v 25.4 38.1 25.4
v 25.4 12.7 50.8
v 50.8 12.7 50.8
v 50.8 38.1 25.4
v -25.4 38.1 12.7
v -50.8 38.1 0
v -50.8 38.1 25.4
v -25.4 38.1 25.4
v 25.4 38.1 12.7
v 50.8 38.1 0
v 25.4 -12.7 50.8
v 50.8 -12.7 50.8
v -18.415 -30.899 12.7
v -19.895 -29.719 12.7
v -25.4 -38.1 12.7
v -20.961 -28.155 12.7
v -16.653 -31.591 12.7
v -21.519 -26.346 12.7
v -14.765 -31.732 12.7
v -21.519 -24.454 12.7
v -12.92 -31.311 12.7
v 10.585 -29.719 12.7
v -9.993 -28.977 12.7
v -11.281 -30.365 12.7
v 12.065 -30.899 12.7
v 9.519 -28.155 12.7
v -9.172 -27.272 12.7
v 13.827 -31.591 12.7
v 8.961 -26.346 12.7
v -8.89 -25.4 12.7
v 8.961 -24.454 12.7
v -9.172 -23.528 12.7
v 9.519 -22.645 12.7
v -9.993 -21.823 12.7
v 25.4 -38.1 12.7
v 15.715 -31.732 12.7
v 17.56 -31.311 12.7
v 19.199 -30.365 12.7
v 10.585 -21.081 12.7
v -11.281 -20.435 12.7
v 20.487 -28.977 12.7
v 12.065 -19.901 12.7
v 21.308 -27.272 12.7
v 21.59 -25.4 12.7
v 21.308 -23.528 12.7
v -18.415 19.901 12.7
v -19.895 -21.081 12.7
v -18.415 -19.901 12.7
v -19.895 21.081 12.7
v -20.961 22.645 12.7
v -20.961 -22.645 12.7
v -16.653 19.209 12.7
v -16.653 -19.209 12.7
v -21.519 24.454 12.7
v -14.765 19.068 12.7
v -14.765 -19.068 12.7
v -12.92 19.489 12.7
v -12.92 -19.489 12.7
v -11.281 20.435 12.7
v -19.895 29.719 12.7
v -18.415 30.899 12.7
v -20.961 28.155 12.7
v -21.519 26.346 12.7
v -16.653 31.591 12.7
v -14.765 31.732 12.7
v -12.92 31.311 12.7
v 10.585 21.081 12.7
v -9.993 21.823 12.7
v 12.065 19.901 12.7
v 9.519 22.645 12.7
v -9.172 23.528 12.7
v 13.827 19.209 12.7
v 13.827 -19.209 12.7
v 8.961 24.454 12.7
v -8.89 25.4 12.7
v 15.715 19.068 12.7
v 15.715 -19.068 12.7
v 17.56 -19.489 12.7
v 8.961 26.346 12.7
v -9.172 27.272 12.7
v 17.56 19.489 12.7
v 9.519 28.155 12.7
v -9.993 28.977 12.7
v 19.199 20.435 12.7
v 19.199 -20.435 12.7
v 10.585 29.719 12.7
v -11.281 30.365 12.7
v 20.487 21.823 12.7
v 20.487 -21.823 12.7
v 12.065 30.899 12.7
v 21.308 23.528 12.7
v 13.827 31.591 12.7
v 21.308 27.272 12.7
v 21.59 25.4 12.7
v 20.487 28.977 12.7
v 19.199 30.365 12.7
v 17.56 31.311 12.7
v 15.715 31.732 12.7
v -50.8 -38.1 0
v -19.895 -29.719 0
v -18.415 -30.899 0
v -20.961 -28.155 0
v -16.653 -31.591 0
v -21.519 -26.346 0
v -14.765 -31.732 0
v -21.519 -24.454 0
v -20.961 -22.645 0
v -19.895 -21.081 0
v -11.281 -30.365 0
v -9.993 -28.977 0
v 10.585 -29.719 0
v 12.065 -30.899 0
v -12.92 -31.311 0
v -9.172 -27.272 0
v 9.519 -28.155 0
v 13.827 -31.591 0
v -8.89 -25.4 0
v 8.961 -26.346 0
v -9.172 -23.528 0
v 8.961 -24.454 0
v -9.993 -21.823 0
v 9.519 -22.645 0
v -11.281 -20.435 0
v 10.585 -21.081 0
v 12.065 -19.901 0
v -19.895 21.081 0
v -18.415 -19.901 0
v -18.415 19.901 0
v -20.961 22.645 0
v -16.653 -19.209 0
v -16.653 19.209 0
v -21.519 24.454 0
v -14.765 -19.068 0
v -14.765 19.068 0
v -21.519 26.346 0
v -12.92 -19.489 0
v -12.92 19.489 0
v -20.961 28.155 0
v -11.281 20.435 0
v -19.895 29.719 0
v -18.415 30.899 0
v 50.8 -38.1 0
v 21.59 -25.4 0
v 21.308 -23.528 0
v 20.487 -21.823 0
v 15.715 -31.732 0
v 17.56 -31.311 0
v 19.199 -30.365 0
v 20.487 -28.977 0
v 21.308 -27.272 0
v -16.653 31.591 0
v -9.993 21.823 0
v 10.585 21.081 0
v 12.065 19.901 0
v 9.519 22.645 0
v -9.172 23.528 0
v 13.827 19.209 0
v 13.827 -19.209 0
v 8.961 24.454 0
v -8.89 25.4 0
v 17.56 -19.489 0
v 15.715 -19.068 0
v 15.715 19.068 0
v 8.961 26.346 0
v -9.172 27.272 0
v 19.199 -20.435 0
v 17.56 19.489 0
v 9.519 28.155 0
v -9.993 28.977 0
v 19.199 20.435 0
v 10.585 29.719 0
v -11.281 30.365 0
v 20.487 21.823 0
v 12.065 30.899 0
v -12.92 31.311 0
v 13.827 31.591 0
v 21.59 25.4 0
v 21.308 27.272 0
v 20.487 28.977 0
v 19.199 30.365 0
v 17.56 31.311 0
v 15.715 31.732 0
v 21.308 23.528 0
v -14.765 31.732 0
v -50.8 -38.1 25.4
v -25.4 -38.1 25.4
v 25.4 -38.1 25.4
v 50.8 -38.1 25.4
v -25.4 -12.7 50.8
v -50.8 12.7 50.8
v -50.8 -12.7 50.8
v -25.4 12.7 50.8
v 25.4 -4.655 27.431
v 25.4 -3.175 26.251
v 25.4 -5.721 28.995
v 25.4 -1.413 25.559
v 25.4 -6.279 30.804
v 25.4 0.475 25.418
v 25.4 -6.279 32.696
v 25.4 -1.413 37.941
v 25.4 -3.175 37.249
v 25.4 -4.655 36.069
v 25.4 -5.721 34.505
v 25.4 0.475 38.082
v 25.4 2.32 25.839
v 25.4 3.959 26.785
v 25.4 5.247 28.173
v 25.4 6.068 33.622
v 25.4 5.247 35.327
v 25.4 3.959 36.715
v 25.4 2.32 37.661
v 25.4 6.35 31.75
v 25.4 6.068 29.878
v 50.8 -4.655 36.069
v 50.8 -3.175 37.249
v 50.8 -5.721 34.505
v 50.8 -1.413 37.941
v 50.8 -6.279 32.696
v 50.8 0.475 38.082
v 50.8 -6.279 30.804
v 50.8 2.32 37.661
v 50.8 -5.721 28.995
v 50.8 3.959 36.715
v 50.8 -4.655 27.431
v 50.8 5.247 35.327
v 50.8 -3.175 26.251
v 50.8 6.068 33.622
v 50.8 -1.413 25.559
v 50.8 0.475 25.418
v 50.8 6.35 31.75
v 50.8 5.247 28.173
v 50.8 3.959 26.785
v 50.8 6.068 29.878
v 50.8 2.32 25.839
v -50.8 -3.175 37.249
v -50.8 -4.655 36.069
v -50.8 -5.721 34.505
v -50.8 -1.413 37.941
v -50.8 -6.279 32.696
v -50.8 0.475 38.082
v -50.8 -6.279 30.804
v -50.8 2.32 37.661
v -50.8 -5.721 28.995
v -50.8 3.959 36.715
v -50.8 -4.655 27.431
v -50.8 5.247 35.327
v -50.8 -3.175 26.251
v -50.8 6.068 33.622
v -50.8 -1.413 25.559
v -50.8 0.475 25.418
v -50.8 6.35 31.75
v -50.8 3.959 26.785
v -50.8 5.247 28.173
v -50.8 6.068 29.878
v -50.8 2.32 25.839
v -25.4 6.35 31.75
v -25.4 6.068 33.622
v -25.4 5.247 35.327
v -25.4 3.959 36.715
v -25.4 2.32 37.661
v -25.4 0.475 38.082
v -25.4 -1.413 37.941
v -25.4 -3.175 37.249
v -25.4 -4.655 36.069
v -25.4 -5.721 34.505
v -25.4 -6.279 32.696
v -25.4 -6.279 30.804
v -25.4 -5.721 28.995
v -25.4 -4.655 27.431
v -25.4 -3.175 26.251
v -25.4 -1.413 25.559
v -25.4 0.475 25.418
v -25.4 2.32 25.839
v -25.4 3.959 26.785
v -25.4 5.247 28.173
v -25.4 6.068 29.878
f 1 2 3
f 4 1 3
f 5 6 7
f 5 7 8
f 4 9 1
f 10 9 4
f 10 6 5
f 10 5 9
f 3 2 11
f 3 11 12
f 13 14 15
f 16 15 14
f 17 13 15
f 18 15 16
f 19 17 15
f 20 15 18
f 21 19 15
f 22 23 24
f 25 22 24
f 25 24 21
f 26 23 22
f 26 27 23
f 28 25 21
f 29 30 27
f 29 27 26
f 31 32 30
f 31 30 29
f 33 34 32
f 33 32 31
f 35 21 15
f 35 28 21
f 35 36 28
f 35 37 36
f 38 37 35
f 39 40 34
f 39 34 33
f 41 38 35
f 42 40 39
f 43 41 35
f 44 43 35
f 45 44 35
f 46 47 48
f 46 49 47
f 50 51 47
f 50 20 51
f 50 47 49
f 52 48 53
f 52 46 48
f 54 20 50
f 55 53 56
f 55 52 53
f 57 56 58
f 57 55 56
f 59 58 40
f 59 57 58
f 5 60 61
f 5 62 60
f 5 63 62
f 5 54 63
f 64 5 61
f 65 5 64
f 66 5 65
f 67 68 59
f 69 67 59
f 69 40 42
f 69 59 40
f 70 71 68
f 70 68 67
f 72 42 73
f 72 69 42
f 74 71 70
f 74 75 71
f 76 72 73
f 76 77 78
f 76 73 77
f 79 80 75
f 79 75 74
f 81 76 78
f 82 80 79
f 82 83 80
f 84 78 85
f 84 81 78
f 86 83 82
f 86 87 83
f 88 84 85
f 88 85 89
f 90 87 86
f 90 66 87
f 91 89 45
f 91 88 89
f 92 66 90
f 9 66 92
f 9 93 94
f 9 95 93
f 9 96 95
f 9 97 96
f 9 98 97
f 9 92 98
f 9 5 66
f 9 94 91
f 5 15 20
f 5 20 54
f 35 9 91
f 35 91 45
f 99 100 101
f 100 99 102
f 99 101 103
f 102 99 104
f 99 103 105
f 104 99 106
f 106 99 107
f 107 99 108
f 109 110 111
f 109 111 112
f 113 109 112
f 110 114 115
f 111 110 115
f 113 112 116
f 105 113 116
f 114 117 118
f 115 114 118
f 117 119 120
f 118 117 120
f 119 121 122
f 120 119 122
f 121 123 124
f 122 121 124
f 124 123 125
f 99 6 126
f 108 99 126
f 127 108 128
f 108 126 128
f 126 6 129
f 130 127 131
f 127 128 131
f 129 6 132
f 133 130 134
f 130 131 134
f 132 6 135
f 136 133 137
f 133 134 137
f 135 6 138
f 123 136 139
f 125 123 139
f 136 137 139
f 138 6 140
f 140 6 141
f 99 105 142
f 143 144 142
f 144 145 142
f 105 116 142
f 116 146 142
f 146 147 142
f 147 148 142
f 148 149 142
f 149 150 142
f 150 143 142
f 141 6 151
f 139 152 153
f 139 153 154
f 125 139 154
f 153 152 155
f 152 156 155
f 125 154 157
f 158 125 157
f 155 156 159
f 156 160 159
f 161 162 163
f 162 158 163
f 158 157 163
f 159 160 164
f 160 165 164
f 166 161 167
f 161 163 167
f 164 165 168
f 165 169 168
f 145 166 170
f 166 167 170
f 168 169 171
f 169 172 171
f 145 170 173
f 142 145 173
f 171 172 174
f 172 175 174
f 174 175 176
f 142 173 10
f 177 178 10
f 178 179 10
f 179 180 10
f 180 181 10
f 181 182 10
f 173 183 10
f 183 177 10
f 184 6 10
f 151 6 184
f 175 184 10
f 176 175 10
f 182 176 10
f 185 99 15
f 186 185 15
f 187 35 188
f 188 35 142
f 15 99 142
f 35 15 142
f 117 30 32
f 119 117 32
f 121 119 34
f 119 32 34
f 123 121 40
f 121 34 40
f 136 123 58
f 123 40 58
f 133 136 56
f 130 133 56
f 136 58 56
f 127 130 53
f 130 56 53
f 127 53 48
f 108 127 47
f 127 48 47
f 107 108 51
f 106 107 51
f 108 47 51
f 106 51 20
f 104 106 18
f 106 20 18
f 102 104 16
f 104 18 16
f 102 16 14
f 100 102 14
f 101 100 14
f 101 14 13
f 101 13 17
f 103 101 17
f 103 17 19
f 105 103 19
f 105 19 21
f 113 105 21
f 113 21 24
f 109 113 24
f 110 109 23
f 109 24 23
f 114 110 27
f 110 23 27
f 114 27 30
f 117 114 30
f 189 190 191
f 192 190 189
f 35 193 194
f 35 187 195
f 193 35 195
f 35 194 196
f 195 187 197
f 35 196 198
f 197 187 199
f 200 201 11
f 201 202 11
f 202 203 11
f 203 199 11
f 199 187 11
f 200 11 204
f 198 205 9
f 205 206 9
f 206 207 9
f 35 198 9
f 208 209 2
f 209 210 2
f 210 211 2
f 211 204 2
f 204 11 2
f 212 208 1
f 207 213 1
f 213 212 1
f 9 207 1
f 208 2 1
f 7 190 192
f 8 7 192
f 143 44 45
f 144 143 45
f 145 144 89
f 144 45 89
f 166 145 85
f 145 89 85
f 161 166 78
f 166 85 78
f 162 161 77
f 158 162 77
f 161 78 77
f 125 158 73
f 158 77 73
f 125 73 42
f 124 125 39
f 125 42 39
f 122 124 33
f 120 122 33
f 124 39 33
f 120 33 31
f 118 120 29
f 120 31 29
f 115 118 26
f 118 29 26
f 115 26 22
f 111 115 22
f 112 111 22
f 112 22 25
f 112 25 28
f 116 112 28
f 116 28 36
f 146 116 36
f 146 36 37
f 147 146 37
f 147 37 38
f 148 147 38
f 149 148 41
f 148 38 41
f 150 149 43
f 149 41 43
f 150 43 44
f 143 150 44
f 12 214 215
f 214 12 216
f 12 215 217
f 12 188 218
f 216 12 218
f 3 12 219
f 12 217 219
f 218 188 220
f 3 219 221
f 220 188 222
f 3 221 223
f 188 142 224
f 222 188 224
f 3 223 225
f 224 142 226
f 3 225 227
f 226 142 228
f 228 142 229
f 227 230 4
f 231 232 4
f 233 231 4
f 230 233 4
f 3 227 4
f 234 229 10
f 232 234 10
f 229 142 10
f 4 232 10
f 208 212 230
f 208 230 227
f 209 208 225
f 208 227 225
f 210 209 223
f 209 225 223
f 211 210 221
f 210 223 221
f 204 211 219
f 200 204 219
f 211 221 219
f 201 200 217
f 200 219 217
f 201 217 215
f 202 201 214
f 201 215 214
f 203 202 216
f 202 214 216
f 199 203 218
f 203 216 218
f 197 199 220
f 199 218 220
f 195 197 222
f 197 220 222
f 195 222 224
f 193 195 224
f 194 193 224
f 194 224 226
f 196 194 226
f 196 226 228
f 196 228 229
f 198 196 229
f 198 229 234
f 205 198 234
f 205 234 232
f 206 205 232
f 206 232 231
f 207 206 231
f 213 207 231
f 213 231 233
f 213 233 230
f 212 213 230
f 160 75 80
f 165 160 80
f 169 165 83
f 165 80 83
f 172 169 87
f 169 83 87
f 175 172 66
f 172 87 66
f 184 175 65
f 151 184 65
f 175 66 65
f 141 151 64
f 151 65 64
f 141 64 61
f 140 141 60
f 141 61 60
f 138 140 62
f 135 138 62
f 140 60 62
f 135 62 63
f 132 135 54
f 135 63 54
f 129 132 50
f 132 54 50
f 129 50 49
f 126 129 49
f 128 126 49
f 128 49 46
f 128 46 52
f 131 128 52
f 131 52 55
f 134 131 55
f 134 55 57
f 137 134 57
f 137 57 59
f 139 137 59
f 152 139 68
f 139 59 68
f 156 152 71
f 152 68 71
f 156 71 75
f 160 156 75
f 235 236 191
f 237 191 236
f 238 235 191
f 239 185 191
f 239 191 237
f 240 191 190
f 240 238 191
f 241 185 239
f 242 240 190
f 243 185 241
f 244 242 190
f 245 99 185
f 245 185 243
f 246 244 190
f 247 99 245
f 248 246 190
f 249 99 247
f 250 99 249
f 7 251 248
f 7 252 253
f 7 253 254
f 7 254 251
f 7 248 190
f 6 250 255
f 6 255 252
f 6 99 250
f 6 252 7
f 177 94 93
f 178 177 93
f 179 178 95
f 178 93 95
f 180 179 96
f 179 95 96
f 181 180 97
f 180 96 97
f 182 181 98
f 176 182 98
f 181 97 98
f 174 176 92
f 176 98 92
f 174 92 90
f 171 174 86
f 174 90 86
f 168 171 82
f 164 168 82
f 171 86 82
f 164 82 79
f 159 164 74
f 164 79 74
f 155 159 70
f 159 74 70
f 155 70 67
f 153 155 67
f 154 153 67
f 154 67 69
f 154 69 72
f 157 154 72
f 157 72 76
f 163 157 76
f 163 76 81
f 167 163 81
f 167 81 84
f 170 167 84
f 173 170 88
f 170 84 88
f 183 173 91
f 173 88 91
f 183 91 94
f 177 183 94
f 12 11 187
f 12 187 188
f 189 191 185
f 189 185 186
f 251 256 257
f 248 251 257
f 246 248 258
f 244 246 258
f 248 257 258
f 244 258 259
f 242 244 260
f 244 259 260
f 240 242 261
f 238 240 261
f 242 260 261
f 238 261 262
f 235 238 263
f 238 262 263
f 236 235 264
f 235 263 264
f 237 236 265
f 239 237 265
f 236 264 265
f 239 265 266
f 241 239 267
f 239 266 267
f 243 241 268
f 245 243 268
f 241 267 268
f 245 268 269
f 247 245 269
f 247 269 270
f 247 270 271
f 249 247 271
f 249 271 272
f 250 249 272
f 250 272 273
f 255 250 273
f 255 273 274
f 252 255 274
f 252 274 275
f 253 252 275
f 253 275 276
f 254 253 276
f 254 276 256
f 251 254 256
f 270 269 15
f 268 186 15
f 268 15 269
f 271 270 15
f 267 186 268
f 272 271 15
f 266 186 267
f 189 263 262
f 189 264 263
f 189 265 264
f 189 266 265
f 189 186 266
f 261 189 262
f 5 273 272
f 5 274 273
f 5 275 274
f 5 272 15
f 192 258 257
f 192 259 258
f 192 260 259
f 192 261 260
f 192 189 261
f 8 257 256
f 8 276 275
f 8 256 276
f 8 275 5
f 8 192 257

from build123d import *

# Parameters (mm, degrees)
F0_W     = 101.6
F0_H     = 76.2
F1_DEPTH = 50.8
F2_W     = 50.8
F2_H     = 76.2
F3_DEPTH = 38.1
F4_SIZE  = 25.4
F5_R     = 6.35
F6_DEPTH = 101.601
F7_R     = 6.35
F8_DEPTH = 12.7


with BuildPart() as f1:
    # F0 (on Top) → F1 (new body)
    with BuildSketch(Plane.XY):
        Rectangle(F0_W, F0_H)
    extrude(amount=F1_DEPTH)

    # F2 (on face) → F3 (cut)
    with BuildSketch(Plane.XY.offset(50.8)):
        Rectangle(F2_W, F2_H)
    extrude(amount=-F3_DEPTH, mode=Mode.SUBTRACT)

    # F4
    f4_edges = [f1.edges().sort_by_distance(p)[0] for p in [
        (-38.1, -38.1, 50.8),
        (38.1, -38.1, 50.8),
        (-38.1, 38.1, 50.8),
        (38.1, 38.1, 50.8),
    ]]
    chamfer(f4_edges, length=F4_SIZE)

    # F5 (on face) → F6 (cut, through all)
    with BuildSketch(Plane.YZ.offset(50.8)):
        with Locations((0, 31.75)):
            Circle(F5_R)
    extrude(amount=-F6_DEPTH, mode=Mode.SUBTRACT)

    # F7 (on face) → F8 (cut, through all)
    with BuildSketch(Plane.XY.offset(12.7)):
        with Locations((-15.24, -25.4)):
            Circle(F7_R)
        with Locations((-15.24, 25.4)):
            Circle(F7_R)
        with Locations((15.24, -25.4)):
            Circle(F7_R)
        with Locations((15.24, 25.4)):
            Circle(F7_R)
    extrude(amount=-F8_DEPTH, mode=Mode.SUBTRACT)


solid = f1.part
